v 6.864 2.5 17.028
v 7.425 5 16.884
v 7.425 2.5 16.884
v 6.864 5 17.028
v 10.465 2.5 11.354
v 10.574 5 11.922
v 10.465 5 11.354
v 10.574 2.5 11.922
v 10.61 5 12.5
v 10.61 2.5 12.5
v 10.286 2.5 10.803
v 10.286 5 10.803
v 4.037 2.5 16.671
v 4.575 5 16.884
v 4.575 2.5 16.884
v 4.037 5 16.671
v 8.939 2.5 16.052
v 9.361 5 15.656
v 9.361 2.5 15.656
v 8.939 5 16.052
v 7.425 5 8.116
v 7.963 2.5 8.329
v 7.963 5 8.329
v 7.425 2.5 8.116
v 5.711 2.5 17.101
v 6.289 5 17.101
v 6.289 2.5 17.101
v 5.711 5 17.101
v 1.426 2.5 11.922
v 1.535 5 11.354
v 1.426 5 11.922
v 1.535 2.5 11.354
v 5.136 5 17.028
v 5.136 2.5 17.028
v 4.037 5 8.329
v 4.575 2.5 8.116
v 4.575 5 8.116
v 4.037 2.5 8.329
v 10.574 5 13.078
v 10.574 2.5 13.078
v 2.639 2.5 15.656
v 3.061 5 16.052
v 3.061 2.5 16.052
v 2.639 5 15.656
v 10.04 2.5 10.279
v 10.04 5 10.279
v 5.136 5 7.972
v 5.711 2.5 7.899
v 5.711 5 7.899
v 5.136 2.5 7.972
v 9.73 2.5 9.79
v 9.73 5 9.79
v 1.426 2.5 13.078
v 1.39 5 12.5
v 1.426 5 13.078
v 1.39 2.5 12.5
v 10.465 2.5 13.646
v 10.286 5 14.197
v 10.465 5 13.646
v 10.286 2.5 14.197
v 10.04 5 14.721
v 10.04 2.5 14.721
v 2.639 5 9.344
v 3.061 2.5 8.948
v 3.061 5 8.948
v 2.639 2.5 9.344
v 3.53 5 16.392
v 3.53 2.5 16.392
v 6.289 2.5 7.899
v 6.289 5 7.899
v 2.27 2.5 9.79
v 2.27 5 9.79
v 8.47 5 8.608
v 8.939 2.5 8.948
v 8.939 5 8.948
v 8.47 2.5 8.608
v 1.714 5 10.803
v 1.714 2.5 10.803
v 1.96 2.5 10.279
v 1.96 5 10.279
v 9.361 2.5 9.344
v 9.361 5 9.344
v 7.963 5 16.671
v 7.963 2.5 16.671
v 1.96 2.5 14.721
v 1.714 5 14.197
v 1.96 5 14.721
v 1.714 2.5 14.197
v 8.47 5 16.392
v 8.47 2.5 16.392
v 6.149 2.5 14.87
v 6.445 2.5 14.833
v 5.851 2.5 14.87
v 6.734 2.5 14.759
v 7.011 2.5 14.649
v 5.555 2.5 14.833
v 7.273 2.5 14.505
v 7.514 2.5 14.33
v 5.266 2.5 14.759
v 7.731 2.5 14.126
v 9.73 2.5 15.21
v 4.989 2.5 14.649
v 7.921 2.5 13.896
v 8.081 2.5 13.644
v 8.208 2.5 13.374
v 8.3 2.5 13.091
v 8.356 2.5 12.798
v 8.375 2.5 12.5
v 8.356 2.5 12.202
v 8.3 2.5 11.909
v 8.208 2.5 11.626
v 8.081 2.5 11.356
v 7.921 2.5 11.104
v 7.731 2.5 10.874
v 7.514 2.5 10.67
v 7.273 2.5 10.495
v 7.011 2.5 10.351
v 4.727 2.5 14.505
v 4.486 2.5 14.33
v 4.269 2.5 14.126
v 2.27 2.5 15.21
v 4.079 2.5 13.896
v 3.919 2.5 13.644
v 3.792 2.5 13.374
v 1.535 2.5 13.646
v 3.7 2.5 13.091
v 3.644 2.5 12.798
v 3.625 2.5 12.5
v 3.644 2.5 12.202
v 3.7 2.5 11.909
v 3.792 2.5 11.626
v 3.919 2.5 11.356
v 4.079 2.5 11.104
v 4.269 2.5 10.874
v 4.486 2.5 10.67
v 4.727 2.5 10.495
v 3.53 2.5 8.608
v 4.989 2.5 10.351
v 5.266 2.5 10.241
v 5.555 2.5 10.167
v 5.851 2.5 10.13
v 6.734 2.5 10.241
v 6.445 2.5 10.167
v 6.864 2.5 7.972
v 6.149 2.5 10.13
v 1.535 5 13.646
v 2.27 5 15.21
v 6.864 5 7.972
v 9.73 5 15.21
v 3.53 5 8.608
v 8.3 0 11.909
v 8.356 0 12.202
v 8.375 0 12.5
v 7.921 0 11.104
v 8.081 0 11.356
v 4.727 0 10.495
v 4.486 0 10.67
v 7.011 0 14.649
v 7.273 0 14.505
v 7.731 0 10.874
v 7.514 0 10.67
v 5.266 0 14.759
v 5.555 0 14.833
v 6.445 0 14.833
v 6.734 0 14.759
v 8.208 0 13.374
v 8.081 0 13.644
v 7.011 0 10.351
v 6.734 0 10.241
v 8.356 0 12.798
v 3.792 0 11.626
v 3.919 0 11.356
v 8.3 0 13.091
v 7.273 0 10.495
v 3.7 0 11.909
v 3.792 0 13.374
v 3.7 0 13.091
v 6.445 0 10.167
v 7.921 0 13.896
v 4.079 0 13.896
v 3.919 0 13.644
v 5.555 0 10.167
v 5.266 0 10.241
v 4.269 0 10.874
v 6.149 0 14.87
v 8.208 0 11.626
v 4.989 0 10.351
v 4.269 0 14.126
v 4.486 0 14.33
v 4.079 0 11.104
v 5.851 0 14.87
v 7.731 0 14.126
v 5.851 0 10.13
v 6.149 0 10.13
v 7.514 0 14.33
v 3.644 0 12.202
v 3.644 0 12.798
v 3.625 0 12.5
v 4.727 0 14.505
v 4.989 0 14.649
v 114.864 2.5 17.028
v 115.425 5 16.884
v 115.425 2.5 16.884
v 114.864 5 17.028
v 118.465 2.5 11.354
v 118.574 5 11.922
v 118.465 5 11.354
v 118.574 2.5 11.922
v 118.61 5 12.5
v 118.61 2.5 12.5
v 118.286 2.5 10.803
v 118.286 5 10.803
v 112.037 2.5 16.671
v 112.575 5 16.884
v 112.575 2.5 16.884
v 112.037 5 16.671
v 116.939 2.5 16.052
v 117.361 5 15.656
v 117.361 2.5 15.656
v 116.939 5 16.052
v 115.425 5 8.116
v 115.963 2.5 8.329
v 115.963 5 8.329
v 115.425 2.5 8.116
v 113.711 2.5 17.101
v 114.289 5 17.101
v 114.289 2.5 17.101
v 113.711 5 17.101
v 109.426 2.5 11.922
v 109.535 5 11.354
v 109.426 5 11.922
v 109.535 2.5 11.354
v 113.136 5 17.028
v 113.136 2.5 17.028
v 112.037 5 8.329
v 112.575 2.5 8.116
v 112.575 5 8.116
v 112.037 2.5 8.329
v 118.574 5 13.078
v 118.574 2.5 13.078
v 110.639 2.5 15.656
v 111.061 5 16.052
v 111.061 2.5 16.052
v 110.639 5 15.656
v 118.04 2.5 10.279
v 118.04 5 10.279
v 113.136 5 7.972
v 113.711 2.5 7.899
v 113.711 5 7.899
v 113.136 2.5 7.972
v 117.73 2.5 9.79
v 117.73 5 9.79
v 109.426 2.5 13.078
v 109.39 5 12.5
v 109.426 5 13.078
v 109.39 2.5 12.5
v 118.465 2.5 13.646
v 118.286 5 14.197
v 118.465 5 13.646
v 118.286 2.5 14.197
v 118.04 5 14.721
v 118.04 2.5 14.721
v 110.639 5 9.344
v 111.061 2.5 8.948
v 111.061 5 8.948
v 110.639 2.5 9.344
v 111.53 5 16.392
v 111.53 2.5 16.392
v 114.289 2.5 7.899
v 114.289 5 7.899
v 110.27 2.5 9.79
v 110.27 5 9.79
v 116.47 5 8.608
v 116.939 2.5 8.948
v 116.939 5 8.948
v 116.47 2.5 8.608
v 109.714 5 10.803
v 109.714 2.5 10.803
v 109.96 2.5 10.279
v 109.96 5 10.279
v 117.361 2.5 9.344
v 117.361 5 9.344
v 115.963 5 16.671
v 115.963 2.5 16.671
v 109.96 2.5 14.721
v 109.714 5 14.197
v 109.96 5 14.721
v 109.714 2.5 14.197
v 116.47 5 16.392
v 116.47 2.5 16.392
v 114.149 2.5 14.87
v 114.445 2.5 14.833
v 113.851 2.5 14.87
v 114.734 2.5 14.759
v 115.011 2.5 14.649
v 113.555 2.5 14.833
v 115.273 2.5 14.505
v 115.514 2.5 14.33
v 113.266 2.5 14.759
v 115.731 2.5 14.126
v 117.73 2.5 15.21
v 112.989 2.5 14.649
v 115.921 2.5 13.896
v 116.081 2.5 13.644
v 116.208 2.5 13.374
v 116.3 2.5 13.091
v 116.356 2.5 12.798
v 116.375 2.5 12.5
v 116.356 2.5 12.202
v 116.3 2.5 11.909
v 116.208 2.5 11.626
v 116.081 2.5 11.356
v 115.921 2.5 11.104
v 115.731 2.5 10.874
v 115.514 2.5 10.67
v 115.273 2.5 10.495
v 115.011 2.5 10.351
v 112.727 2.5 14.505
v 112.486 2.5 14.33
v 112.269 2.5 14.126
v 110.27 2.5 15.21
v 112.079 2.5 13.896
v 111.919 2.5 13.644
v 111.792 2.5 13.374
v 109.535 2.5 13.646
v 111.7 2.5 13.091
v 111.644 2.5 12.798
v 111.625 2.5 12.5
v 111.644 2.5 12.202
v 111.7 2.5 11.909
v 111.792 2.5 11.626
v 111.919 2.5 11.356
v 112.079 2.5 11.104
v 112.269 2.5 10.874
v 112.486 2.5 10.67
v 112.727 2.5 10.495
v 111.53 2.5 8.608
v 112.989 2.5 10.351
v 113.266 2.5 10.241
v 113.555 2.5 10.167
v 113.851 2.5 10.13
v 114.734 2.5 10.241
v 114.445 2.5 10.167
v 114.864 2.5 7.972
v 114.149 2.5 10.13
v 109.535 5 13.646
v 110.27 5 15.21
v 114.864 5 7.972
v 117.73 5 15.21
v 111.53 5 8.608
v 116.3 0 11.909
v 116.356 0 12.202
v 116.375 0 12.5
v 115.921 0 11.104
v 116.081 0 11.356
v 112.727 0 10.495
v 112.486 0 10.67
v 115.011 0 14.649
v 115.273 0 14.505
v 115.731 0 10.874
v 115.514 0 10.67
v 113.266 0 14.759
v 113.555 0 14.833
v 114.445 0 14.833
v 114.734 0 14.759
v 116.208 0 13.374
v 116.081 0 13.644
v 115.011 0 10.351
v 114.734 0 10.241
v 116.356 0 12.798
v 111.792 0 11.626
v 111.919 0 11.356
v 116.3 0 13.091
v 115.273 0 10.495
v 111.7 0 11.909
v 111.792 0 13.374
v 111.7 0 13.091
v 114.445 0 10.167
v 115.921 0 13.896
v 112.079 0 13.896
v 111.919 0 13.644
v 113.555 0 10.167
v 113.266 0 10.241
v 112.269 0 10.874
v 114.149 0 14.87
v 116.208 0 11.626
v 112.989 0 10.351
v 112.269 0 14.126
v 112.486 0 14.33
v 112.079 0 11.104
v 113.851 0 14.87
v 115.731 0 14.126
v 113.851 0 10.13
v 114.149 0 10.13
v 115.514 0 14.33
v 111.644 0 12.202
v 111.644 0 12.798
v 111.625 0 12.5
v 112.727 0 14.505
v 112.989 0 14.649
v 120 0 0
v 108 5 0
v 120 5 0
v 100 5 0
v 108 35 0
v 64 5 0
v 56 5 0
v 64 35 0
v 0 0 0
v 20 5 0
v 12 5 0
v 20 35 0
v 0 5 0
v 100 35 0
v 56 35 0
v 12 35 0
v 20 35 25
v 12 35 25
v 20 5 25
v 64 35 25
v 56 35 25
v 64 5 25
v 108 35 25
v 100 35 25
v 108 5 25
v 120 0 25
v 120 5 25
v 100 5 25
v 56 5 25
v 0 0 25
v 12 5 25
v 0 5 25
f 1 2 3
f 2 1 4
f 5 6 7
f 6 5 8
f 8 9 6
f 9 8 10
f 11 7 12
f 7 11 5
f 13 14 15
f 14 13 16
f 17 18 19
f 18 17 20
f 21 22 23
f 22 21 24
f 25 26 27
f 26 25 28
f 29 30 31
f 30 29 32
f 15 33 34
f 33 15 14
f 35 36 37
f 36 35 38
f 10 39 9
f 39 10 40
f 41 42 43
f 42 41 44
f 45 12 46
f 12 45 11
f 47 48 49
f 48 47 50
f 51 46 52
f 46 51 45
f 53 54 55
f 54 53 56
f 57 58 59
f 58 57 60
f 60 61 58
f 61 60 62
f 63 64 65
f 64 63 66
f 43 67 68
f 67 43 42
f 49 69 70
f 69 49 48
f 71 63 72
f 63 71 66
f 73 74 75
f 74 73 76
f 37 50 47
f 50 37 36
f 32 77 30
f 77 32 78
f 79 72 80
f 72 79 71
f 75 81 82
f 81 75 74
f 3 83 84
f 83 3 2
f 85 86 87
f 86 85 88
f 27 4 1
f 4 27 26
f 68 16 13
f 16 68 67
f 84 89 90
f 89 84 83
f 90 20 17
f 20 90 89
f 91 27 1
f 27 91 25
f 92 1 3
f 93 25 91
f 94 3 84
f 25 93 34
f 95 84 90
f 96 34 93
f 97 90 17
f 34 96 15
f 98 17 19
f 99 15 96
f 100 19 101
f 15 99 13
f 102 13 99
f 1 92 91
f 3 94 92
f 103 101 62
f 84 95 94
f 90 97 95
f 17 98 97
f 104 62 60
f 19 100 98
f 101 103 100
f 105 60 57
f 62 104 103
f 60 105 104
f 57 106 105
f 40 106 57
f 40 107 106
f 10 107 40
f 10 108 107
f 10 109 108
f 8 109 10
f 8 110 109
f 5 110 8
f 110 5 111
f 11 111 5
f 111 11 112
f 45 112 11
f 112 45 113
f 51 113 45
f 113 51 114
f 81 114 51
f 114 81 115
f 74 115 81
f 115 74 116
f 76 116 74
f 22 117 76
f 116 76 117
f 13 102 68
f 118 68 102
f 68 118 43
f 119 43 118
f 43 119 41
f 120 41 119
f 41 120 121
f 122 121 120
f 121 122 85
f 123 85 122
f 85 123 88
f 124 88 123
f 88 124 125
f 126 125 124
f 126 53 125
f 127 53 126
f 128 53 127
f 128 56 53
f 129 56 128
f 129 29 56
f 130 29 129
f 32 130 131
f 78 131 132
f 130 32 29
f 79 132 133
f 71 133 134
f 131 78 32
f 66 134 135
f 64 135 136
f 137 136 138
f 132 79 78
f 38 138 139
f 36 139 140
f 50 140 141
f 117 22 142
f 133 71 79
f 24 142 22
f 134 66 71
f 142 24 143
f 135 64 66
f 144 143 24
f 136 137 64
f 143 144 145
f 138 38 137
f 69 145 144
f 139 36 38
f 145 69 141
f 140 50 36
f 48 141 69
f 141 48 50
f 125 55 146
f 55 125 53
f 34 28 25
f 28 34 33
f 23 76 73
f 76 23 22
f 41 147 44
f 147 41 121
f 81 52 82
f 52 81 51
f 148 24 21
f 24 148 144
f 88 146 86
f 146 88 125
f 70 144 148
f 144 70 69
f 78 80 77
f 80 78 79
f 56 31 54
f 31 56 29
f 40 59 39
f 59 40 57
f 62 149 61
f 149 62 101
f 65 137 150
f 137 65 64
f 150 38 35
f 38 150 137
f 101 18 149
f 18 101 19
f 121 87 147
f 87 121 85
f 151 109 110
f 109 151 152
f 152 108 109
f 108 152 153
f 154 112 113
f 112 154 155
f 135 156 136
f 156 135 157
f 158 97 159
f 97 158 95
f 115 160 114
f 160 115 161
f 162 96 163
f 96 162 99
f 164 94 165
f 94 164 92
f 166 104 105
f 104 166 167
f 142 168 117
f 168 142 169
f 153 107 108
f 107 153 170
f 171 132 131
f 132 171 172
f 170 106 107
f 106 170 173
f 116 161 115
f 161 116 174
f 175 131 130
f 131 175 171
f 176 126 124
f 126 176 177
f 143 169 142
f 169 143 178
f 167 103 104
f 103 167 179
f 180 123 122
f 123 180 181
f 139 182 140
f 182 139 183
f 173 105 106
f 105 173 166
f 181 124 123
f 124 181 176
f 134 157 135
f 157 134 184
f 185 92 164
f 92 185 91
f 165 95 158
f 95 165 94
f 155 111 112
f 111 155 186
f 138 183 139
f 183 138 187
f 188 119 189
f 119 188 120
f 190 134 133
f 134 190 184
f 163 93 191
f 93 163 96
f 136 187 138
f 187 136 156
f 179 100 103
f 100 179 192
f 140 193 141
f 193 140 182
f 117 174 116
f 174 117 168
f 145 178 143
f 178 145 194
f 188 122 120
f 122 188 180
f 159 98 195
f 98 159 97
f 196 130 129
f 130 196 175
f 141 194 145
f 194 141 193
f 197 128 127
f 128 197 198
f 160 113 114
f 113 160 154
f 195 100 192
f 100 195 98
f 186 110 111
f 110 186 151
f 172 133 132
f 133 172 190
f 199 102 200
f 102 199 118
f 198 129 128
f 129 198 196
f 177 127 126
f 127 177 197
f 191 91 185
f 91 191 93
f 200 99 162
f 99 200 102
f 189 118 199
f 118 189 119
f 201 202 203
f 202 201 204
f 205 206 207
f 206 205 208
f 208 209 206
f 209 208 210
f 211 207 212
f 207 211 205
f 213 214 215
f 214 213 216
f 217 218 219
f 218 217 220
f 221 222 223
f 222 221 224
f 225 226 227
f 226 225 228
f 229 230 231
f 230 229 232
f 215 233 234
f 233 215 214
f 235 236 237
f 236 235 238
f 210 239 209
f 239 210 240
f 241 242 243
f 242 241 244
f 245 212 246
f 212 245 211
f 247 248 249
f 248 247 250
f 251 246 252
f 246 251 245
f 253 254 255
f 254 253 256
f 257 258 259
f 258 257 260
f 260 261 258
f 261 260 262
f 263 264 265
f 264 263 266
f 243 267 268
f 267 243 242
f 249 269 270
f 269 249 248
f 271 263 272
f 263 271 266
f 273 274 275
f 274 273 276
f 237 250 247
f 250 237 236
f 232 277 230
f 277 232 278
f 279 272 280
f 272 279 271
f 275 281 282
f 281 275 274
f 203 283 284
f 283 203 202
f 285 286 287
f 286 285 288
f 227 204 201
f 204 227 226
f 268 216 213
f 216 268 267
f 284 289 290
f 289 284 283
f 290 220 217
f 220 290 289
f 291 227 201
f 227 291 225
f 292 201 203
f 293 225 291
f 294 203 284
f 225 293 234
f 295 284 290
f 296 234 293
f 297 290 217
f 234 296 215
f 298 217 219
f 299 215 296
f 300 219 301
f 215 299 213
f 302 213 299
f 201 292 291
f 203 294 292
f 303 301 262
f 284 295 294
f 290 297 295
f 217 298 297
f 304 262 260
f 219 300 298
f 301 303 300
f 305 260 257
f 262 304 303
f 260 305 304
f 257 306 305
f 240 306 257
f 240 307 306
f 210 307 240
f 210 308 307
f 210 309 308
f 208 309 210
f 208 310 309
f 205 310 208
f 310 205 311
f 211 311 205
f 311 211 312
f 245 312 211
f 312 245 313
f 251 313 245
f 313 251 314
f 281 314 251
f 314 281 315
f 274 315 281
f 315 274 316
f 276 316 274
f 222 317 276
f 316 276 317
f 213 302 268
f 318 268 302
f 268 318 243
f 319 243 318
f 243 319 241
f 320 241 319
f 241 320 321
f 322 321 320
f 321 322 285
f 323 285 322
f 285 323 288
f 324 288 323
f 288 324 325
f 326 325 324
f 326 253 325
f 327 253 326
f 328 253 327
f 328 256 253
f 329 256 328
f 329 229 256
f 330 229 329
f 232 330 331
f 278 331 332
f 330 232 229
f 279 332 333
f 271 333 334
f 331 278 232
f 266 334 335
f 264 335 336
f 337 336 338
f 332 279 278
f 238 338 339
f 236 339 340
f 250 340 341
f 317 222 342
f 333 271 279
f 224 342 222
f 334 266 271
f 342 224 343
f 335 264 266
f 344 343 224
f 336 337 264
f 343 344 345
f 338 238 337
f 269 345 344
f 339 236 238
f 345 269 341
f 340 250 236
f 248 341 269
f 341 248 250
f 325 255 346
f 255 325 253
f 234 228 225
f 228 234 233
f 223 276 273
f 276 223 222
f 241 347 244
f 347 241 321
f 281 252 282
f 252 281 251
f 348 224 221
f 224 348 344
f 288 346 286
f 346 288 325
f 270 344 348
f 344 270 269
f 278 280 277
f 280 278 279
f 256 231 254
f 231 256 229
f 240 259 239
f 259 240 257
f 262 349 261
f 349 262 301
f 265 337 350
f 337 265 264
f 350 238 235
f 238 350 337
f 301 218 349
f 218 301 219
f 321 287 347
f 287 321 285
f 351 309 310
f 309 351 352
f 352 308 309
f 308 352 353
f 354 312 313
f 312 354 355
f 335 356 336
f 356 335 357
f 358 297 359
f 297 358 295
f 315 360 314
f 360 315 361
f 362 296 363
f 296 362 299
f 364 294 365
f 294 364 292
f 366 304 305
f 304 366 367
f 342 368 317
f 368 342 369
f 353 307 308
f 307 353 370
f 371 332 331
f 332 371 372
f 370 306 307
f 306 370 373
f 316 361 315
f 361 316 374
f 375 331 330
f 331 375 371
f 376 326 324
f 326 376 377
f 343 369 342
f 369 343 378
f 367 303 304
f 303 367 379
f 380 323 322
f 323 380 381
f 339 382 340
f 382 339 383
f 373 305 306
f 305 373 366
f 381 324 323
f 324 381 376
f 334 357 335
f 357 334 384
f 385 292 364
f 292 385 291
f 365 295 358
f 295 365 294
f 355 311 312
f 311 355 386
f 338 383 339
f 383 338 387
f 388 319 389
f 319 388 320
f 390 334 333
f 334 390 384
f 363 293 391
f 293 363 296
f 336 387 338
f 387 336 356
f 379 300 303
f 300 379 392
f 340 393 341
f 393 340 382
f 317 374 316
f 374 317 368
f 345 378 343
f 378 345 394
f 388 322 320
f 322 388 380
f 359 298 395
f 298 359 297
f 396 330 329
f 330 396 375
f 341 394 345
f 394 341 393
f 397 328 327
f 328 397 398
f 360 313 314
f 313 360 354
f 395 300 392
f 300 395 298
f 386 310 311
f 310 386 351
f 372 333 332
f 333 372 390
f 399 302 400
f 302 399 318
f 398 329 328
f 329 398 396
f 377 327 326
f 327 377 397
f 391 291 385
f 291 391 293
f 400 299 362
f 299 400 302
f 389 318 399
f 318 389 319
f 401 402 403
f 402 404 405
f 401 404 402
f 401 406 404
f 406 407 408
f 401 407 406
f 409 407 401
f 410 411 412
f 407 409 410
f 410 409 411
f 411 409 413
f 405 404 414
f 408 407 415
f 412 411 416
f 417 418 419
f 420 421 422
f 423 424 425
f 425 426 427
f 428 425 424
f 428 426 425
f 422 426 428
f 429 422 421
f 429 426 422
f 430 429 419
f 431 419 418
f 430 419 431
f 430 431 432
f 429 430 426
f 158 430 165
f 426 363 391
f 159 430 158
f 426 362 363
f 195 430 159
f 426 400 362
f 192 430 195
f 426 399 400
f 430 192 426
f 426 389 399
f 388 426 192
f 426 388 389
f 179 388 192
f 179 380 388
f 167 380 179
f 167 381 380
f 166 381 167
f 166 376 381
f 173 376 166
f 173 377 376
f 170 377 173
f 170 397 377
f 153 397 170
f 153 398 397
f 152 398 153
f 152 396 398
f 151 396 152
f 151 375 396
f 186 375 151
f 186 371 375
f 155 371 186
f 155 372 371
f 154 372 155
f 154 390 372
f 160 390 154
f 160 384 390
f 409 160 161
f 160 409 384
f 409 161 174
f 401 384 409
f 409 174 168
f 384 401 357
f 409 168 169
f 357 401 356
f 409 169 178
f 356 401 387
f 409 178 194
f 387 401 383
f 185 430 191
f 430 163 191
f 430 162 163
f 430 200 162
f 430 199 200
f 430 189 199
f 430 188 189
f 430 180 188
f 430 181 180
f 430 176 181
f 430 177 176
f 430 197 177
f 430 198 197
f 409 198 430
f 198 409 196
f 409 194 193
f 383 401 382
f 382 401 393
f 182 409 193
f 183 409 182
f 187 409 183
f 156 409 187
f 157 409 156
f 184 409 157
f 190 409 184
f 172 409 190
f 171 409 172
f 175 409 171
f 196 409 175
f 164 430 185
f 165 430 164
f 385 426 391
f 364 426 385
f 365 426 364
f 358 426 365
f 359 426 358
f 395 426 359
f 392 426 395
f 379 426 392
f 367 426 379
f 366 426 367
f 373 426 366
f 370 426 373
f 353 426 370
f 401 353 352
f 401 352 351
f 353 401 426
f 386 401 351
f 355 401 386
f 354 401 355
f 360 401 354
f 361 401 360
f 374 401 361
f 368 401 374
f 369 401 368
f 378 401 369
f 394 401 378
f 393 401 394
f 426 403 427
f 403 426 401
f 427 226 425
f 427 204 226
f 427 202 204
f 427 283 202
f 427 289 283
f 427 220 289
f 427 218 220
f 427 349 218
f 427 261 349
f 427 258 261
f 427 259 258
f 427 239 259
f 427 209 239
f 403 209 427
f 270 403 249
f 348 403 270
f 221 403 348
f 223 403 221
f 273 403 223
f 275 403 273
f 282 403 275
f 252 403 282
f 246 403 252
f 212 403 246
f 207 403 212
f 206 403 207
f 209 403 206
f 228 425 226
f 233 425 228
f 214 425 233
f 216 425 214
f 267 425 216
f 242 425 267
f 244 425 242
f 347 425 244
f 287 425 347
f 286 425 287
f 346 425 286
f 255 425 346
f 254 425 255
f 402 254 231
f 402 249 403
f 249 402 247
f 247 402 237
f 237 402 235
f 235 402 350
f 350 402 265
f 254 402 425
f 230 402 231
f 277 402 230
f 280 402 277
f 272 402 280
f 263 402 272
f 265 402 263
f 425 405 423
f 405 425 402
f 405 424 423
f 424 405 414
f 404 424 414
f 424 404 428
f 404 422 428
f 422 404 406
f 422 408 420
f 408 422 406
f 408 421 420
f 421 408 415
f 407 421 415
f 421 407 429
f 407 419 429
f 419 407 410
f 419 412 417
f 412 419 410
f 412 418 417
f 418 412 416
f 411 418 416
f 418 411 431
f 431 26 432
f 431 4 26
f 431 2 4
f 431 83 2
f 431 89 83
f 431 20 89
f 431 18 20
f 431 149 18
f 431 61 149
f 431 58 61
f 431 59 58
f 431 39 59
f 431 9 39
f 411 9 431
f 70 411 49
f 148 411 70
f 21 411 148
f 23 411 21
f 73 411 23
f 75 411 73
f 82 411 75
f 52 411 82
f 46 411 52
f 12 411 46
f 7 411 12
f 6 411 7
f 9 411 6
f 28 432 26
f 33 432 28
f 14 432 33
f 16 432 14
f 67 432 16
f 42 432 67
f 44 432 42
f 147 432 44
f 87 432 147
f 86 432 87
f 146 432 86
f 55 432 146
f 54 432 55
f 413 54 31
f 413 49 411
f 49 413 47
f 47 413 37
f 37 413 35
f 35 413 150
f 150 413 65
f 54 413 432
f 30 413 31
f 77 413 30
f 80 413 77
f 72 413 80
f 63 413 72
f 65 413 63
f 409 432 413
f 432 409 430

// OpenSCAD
$fn = 50;

a = 120;
b = 25;
c = 5;
d = 30;
e = 12;
f = 36;
g = 8;
h = 9.22/2;
i = 4.75/2;

difference()
{
	color("grey") linear_extrude(height = b) union()
	{
		square(size = [a, c]);
		translate([e, c]) square(size = [g, d]);
		translate([e+g+f, c]) square(size = [g, d]);
		translate([e+g+f+g+f, c]) square(size = [g, d]);
	}

	color("green") translate([e/2, c/2, b/2]) rotate([-90, 0, 0]) union()
	{
		cylinder(r = h, h = c);
		translate([0,0,-c]) cylinder(r = i, h = c);
	}

	color("green") translate([a - e/2, c/2, b/2]) rotate([-90, 0, 0]) union()
	{
		cylinder(r = h, h = c);
		translate([0,0,-c]) cylinder(r = i, h = c);
	}
}
